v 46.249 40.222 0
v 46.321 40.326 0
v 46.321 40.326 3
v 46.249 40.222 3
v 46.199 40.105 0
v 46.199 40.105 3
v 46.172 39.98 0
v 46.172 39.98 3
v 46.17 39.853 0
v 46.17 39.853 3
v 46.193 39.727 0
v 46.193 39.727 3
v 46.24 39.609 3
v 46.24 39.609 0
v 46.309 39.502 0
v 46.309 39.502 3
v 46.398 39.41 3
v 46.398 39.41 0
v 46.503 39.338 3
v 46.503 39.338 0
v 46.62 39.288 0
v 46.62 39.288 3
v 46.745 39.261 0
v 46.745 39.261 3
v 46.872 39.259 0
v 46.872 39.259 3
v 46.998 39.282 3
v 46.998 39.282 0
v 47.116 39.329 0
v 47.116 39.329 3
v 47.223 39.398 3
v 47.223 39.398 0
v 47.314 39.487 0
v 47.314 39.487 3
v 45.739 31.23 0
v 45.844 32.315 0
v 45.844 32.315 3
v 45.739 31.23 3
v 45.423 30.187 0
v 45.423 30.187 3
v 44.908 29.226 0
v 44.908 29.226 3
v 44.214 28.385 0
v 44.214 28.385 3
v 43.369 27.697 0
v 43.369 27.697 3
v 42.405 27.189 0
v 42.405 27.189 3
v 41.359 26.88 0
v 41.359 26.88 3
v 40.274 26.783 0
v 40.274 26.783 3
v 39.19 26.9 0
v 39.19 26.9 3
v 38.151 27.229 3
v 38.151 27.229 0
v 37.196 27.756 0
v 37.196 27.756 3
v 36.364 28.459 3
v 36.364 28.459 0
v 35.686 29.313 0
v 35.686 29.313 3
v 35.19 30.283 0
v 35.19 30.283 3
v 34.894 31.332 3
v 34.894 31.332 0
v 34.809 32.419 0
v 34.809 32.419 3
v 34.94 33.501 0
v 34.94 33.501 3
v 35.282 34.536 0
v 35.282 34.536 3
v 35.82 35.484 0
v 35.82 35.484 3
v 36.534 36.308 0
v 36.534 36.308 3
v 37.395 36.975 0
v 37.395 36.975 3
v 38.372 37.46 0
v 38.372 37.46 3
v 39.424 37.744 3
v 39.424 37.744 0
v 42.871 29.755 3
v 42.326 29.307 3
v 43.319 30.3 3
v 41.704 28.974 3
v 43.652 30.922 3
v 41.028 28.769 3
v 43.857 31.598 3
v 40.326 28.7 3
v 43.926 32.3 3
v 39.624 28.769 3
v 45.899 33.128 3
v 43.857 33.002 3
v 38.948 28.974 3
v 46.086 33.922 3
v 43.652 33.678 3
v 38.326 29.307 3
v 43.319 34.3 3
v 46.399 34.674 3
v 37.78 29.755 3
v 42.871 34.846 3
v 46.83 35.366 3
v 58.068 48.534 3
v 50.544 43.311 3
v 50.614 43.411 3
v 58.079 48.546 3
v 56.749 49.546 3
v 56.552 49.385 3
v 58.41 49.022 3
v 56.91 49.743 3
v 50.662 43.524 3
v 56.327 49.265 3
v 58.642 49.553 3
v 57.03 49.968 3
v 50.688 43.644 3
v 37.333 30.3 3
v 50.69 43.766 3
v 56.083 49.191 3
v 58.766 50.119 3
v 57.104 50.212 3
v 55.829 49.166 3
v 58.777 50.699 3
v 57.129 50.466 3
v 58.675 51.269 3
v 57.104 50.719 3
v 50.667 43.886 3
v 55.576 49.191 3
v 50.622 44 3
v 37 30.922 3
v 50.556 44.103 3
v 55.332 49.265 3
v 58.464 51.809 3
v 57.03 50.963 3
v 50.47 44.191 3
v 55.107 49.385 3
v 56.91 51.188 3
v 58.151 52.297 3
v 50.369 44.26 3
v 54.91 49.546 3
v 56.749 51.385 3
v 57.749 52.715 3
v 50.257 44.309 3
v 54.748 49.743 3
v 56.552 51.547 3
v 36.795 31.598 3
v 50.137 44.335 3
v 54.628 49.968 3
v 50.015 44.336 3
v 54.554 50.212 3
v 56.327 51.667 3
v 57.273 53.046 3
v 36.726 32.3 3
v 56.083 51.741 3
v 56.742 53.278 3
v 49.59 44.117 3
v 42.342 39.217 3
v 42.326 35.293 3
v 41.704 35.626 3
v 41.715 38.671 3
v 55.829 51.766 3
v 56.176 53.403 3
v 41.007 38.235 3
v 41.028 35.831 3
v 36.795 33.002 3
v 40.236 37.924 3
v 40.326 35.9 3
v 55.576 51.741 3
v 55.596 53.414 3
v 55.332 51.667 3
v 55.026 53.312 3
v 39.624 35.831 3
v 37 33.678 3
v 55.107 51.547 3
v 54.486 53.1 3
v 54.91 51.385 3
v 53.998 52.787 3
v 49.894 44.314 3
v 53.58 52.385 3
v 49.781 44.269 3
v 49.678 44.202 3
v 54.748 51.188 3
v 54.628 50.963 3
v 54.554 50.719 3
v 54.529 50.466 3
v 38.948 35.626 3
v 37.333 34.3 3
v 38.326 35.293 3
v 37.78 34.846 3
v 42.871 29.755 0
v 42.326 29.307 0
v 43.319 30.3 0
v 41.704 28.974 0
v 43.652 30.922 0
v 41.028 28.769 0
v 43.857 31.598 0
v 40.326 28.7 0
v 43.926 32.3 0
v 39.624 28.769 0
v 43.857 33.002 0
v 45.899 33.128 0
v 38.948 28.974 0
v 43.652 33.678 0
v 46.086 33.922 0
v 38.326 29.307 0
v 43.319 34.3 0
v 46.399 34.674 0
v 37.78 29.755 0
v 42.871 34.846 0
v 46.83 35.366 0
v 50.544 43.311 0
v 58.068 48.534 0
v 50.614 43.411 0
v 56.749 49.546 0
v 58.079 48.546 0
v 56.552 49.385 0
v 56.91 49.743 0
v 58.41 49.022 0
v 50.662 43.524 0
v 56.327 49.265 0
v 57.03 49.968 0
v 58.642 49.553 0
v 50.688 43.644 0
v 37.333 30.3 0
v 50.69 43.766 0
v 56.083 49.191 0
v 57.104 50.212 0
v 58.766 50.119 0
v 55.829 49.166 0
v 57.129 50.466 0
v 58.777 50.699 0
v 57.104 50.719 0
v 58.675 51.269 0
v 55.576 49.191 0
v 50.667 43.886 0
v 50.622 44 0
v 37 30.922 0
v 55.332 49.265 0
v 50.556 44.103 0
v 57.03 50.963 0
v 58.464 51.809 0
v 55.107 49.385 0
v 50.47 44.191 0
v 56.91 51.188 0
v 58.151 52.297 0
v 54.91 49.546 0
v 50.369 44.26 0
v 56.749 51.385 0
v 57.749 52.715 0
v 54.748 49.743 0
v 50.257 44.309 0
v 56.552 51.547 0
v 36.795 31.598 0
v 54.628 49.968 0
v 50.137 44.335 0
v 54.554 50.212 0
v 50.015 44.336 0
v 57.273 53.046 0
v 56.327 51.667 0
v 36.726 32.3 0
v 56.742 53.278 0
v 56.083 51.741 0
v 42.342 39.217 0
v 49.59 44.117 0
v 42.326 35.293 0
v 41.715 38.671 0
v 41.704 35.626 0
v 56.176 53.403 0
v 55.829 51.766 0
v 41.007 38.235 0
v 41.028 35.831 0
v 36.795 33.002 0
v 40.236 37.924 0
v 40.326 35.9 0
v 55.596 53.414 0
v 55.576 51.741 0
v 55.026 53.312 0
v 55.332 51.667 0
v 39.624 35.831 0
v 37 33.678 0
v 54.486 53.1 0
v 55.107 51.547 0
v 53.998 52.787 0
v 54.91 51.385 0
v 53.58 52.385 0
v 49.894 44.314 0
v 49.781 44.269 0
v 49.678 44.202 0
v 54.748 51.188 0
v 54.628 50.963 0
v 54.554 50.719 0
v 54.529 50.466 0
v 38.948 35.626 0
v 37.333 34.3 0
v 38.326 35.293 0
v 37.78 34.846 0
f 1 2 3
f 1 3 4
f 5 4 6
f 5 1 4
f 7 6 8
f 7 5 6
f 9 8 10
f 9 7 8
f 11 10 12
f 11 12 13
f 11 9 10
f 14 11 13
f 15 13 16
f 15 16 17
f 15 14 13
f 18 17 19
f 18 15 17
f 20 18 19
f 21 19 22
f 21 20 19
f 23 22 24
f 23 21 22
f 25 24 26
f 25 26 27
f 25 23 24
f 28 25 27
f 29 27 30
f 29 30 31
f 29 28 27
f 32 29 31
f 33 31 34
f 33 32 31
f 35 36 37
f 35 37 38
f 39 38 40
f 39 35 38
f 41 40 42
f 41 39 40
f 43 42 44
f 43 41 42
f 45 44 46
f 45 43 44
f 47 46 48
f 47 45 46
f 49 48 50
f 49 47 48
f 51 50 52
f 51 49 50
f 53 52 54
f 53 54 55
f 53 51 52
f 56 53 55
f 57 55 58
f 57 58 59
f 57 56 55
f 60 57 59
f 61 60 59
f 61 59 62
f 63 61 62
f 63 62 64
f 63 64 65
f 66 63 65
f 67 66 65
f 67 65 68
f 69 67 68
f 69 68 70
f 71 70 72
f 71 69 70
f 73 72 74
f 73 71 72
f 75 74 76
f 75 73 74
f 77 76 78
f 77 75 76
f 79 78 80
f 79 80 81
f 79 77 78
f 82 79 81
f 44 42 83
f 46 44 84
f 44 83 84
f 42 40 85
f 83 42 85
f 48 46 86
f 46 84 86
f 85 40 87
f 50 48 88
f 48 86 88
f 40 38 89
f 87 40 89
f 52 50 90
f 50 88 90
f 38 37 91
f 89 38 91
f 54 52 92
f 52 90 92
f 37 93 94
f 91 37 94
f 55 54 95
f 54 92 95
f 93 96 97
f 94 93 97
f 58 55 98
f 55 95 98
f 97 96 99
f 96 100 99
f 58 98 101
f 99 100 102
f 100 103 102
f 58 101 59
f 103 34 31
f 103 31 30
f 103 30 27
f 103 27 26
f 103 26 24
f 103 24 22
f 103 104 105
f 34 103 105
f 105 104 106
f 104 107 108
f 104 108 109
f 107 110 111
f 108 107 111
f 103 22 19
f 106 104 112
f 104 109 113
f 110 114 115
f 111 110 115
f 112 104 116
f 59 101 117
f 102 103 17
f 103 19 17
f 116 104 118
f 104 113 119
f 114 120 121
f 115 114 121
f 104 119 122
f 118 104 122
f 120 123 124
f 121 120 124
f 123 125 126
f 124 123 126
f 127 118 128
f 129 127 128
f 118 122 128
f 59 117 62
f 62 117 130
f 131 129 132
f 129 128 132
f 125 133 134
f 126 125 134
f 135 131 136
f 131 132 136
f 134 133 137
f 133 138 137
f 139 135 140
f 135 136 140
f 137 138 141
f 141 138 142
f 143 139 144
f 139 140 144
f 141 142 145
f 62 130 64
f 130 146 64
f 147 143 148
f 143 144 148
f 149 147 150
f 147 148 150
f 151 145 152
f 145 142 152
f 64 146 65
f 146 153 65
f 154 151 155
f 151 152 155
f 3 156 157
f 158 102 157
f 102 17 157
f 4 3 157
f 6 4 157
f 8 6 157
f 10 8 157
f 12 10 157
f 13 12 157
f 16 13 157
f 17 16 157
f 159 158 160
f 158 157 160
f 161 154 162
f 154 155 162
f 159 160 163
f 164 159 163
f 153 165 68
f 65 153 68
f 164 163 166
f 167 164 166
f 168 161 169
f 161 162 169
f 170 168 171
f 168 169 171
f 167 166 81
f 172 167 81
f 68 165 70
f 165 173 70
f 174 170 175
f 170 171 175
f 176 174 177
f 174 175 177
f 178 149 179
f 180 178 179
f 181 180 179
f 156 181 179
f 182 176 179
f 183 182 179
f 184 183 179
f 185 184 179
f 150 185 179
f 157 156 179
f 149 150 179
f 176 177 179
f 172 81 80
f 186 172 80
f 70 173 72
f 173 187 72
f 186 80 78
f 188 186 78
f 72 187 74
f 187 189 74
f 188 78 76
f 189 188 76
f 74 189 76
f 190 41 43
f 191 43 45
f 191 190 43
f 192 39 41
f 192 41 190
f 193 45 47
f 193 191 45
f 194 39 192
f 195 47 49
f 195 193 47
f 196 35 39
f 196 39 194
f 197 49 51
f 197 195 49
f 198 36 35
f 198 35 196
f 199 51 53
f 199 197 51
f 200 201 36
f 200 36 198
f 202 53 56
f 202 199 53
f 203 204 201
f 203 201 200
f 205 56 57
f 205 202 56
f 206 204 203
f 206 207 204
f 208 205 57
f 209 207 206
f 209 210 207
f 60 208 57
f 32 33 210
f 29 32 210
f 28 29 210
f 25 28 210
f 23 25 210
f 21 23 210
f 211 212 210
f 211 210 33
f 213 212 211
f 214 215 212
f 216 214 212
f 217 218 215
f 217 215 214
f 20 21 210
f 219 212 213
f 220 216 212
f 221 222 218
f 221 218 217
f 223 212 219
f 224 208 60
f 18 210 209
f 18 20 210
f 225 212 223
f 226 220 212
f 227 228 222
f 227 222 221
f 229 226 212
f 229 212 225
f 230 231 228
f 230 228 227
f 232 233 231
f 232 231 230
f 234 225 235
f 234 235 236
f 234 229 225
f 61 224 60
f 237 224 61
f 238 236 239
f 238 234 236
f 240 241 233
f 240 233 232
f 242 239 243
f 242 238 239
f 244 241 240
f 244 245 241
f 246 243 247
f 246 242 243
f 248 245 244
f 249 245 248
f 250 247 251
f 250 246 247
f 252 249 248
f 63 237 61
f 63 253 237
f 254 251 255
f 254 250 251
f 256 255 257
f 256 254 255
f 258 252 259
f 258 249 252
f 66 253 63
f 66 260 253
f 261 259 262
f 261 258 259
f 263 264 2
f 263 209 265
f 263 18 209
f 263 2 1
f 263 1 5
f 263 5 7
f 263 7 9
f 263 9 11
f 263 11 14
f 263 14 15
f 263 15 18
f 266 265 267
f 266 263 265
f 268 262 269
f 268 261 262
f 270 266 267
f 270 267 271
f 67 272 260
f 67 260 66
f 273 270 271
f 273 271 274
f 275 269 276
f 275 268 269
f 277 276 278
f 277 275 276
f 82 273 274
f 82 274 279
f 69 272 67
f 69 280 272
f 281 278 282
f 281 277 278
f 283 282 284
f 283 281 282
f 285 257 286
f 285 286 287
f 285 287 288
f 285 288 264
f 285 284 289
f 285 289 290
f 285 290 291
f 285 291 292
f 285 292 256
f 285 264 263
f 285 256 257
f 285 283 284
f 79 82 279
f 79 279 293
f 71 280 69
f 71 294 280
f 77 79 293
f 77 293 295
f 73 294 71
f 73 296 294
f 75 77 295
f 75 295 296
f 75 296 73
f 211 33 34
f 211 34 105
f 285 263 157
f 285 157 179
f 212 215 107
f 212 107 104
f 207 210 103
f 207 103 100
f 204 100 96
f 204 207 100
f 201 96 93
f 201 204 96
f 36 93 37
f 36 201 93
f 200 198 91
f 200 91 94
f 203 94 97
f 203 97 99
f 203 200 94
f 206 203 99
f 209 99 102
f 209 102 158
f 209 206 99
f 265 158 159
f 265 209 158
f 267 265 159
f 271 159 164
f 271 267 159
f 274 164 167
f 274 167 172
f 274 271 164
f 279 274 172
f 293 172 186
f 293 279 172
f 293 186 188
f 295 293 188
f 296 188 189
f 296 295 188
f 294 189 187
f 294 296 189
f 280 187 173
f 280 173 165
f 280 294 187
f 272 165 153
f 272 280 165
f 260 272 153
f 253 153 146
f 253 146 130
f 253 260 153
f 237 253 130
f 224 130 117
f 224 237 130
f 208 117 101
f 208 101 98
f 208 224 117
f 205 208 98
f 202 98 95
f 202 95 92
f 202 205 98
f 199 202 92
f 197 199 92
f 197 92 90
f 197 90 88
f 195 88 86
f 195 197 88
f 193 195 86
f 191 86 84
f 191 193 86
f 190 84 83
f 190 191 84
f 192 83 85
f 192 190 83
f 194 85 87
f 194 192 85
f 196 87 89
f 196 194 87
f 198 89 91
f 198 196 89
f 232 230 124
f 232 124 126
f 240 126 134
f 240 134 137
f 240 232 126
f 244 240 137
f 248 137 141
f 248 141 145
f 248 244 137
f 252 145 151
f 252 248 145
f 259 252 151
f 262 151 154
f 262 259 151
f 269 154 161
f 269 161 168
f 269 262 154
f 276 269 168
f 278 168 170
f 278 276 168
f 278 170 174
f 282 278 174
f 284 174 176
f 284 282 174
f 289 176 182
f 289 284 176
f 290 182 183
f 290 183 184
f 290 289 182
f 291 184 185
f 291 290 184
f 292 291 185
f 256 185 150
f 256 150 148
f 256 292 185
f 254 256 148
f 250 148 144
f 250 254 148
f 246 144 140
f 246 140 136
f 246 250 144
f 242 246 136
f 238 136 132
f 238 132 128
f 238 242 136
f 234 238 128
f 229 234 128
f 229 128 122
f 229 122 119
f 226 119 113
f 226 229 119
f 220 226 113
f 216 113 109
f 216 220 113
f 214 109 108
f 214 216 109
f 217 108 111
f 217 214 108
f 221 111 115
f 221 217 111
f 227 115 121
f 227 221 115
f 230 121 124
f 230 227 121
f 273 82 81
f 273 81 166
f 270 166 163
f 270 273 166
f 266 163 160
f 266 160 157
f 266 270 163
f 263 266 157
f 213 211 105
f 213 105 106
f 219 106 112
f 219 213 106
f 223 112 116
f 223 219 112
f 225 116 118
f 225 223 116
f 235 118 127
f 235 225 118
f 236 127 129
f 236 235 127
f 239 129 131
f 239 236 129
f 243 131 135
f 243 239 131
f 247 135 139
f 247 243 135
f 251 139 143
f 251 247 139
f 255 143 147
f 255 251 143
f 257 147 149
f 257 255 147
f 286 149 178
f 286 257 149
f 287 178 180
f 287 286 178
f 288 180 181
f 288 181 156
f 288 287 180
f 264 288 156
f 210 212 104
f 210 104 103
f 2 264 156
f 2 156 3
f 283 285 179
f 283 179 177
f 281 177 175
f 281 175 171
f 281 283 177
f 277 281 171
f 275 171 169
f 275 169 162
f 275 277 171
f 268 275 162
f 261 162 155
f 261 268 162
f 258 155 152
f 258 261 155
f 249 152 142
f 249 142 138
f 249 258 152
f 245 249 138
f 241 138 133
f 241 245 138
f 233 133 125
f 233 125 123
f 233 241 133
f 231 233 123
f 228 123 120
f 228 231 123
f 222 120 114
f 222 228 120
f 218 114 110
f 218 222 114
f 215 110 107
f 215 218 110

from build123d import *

# Parameters (mm, degrees)
MODEL_R             = 3.6
MODEL_R_2           = 1.3
BOSS_EXTRUDE1_DEPTH = 3


with BuildPart() as part:
    # Model → Boss-Extrude1 (new body)
    with BuildSketch(Plane.XY):
        with BuildLine():
            Line((58.068440008, 48.533872703), (46.830105606, 35.365817257))
            ThreePointArc((46.830105606, 35.365817257), (46.085714126, 33.921588349), (45.843713156, 32.314929909))
            ThreePointArc((45.843713156, 32.314929909), (36.762881301, 28.086852553), (39.424151137, 37.743756206))
            ThreePointArc((39.424151137, 37.743756206), (41.006745997, 38.235421473), (42.341707312, 39.217368271))
            Line((42.341707312, 39.217368271), (53.580041714, 52.385423717))
            ThreePointArc((53.580041714, 52.385423717), (57.749130002, 52.715057779), (58.078764064, 48.54596949))
            Line((58.078764064, 48.54596949), (58.068440008, 48.533872703))
        make_face()
        with Locations((40.325895646, 32.300100558)):
            Circle(MODEL_R, mode=Mode.SUBTRACT)
        with Locations((55.829402889, 50.465696604)):
            Circle(MODEL_R_2, mode=Mode.SUBTRACT)
        with BuildLine():
            Line((47.314287018, 39.487196923), (50.544132712, 43.310523772))
            ThreePointArc((50.544132712, 43.310523772), (50.470318272, 44.19097138), (49.589870666, 44.117156913))
            Line((49.589870666, 44.117156913), (46.321463386, 40.326423493))
            ThreePointArc((46.321463386, 40.326423493), (46.398261906, 39.41039838), (47.314287018, 39.487196923))
        make_face(mode=Mode.SUBTRACT)
    extrude(amount=BOSS_EXTRUDE1_DEPTH)


solid = part.part
